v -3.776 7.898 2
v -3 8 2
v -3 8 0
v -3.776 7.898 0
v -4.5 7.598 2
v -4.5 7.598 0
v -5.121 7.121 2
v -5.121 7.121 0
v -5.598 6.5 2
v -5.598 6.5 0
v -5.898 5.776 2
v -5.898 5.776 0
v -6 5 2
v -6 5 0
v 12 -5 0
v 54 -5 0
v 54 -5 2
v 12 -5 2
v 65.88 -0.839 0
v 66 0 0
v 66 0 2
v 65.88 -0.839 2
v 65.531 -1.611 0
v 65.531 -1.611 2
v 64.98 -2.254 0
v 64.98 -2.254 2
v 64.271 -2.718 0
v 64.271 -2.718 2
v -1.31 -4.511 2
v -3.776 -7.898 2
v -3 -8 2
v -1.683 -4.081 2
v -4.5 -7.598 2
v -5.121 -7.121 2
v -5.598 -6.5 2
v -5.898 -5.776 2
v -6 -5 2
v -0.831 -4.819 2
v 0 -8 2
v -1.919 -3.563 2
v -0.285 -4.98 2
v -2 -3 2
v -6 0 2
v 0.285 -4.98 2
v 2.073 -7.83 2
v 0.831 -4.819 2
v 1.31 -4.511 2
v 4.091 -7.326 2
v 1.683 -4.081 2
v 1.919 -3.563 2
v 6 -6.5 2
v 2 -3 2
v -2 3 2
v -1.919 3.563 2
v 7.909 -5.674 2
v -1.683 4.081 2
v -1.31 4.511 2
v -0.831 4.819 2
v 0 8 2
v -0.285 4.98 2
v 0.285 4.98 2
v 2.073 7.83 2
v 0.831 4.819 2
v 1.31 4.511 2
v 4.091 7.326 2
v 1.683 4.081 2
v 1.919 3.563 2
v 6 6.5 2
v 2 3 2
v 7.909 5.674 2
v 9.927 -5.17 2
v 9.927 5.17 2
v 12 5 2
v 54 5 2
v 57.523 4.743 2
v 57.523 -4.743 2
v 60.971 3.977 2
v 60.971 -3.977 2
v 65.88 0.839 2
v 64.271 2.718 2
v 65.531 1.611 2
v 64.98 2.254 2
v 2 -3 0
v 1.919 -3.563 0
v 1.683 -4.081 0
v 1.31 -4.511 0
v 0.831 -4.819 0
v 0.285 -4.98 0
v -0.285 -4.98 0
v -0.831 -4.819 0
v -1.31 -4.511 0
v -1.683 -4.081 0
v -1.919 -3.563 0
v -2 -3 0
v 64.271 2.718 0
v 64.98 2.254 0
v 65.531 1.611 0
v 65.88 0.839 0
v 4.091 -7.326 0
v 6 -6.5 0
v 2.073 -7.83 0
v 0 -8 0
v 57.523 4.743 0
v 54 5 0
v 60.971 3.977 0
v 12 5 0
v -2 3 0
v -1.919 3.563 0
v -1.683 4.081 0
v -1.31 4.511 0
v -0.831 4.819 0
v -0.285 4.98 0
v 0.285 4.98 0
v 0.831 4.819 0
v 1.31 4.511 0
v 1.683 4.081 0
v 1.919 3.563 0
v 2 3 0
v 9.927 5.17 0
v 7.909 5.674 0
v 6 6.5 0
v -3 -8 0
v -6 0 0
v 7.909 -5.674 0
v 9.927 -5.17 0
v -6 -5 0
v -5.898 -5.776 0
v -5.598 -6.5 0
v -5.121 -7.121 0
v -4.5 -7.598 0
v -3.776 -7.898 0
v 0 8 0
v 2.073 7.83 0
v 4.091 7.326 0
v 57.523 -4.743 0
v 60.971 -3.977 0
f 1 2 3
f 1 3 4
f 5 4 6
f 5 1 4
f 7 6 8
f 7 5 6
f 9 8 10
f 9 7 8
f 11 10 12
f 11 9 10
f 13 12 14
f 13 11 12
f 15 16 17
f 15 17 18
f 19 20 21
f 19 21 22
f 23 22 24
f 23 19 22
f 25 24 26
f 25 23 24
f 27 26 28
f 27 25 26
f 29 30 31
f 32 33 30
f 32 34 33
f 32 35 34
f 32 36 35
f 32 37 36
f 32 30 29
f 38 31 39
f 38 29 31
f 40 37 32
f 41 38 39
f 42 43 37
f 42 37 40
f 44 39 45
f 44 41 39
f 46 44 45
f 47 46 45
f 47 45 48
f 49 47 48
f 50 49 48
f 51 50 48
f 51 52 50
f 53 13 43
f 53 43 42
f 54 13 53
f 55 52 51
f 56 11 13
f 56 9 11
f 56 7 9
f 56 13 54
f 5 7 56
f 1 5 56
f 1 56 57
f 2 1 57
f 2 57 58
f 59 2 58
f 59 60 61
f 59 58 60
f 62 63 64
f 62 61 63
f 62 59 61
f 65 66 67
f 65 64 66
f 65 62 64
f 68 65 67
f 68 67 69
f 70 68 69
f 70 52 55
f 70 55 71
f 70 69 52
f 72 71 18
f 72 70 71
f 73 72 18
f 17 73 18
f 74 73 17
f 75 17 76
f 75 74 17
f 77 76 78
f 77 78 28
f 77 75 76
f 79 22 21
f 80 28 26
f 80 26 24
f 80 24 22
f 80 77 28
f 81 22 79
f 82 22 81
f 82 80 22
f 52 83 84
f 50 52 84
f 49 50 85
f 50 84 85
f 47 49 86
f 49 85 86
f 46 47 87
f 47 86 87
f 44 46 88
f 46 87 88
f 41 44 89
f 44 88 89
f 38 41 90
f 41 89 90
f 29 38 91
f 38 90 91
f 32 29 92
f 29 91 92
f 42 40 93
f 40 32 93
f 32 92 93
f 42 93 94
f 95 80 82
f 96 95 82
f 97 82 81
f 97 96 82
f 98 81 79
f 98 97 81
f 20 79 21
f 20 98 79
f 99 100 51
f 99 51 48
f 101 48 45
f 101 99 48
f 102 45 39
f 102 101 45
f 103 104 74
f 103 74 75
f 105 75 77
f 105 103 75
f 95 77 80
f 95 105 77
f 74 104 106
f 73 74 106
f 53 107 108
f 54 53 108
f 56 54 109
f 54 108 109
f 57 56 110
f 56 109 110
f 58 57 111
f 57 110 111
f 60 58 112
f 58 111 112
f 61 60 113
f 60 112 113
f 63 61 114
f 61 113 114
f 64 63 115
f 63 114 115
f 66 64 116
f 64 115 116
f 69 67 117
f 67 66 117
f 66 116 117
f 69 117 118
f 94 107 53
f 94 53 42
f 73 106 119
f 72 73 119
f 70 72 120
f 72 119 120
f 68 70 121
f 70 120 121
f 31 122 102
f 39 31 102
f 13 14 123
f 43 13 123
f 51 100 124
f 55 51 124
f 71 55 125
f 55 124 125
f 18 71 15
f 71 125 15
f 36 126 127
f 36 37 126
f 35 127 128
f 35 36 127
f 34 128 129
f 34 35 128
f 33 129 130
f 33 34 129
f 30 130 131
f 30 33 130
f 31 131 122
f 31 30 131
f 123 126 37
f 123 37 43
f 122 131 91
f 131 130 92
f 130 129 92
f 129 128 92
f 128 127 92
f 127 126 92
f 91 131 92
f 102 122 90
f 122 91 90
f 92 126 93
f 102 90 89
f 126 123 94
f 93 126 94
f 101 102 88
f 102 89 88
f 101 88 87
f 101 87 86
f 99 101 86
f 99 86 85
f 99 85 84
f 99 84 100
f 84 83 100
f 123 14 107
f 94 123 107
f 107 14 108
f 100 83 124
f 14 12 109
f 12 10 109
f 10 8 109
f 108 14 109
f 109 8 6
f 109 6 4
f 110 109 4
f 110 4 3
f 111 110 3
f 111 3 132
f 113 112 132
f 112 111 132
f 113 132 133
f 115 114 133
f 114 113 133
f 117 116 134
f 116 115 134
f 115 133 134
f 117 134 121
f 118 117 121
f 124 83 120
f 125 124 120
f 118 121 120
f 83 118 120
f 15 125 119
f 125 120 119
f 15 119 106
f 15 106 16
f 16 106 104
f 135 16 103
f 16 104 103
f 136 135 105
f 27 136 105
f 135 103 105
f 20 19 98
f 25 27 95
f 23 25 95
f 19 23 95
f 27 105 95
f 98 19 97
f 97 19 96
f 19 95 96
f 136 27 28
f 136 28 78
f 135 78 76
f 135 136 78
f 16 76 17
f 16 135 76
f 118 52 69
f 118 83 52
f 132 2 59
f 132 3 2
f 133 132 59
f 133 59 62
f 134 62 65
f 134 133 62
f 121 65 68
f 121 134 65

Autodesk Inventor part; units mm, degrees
ref_plane "YZ Plane" through (0, 0, 0) normal (1, 0, 0) x (0, 1, 0)
ref_plane "XZ Plane" through (0, 0, 0) normal (0, 1, 0) x (-1, 0, 0)
ref_plane "XY Plane" through (0, 0, 0) normal (0, 0, 1) x (1, 0, 0)
sketch "スケッチ1" plane through (0, 0, 0) normal (0, 0, 1) x (1, 0, 0)
  line L0 (0, 3) -> (0, -3) construction
  line L1 (-2, 3) -> (-2, -3)
  line L2 (2, -3) -> (2, 3)
  arc A0 (2, 3) -> (-2, 3) centre (0, 3) ccw
  arc A1 (-2, -3) -> (2, -3) centre (0, -3) ccw
  arc A2 (64.2706, 2.7176) -> (54, 5) centre (54, -19.25) ccw
  line L3 (54, 5) -> (12, 5)
  line L4 (-6, 8) -> (0, 8)
  arc A3 (6, 6.5) -> (0, 8) centre (0, -4.75) ccw
  arc A4 (6, 6.5) -> (12, 5) centre (12, 17.75) ccw
  line L5 (-6, 8) -> (-6, 0)
  line L6 (-6, 0) -> (66, 0) construction
  arc A5 (66, 0) -> (64.2706, 2.7176) centre (63, 0) ccw
  arc A6 (54, -5) -> (64.2706, -2.7176) centre (54, 19.25) ccw
  line L7 (54, -5) -> (12, -5)
  line L8 (-6, -8) -> (0, -8)
  arc A7 (12, -5) -> (6, -6.5) centre (12, -17.75) ccw
  line L9 (-6, -8) -> (-6, 0)
  arc A8 (64.2706, -2.7176) -> (66, 0) centre (63, 0) ccw
  arc A9 (0, -8) -> (6, -6.5) centre (0, 4.75) ccw
  point P0 (0, 0)
  point P1 (0, 0)
  point P2 (0, 5)
  point P3 (0, -5)
  dimension "d0" = 4
  dimension "d1" = 10
  dimension "d2" = 8
  dimension "d3" = 6
  dimension "d4" = 0
  dimension "d5" = 5
  dimension "d6" = 12
  dimension "d7" = 6
  dimension "d8" = 72
  dimension "d9" = 3
  dimension "d10" = 9
extrude "押し出し1" add sketch "スケッチ1" along normal blind 2
fillet "フィレット1" radius 3 2 edges at (-6, 8, 1) (-6, -8, 1)
properties part number "fastener_strap"
